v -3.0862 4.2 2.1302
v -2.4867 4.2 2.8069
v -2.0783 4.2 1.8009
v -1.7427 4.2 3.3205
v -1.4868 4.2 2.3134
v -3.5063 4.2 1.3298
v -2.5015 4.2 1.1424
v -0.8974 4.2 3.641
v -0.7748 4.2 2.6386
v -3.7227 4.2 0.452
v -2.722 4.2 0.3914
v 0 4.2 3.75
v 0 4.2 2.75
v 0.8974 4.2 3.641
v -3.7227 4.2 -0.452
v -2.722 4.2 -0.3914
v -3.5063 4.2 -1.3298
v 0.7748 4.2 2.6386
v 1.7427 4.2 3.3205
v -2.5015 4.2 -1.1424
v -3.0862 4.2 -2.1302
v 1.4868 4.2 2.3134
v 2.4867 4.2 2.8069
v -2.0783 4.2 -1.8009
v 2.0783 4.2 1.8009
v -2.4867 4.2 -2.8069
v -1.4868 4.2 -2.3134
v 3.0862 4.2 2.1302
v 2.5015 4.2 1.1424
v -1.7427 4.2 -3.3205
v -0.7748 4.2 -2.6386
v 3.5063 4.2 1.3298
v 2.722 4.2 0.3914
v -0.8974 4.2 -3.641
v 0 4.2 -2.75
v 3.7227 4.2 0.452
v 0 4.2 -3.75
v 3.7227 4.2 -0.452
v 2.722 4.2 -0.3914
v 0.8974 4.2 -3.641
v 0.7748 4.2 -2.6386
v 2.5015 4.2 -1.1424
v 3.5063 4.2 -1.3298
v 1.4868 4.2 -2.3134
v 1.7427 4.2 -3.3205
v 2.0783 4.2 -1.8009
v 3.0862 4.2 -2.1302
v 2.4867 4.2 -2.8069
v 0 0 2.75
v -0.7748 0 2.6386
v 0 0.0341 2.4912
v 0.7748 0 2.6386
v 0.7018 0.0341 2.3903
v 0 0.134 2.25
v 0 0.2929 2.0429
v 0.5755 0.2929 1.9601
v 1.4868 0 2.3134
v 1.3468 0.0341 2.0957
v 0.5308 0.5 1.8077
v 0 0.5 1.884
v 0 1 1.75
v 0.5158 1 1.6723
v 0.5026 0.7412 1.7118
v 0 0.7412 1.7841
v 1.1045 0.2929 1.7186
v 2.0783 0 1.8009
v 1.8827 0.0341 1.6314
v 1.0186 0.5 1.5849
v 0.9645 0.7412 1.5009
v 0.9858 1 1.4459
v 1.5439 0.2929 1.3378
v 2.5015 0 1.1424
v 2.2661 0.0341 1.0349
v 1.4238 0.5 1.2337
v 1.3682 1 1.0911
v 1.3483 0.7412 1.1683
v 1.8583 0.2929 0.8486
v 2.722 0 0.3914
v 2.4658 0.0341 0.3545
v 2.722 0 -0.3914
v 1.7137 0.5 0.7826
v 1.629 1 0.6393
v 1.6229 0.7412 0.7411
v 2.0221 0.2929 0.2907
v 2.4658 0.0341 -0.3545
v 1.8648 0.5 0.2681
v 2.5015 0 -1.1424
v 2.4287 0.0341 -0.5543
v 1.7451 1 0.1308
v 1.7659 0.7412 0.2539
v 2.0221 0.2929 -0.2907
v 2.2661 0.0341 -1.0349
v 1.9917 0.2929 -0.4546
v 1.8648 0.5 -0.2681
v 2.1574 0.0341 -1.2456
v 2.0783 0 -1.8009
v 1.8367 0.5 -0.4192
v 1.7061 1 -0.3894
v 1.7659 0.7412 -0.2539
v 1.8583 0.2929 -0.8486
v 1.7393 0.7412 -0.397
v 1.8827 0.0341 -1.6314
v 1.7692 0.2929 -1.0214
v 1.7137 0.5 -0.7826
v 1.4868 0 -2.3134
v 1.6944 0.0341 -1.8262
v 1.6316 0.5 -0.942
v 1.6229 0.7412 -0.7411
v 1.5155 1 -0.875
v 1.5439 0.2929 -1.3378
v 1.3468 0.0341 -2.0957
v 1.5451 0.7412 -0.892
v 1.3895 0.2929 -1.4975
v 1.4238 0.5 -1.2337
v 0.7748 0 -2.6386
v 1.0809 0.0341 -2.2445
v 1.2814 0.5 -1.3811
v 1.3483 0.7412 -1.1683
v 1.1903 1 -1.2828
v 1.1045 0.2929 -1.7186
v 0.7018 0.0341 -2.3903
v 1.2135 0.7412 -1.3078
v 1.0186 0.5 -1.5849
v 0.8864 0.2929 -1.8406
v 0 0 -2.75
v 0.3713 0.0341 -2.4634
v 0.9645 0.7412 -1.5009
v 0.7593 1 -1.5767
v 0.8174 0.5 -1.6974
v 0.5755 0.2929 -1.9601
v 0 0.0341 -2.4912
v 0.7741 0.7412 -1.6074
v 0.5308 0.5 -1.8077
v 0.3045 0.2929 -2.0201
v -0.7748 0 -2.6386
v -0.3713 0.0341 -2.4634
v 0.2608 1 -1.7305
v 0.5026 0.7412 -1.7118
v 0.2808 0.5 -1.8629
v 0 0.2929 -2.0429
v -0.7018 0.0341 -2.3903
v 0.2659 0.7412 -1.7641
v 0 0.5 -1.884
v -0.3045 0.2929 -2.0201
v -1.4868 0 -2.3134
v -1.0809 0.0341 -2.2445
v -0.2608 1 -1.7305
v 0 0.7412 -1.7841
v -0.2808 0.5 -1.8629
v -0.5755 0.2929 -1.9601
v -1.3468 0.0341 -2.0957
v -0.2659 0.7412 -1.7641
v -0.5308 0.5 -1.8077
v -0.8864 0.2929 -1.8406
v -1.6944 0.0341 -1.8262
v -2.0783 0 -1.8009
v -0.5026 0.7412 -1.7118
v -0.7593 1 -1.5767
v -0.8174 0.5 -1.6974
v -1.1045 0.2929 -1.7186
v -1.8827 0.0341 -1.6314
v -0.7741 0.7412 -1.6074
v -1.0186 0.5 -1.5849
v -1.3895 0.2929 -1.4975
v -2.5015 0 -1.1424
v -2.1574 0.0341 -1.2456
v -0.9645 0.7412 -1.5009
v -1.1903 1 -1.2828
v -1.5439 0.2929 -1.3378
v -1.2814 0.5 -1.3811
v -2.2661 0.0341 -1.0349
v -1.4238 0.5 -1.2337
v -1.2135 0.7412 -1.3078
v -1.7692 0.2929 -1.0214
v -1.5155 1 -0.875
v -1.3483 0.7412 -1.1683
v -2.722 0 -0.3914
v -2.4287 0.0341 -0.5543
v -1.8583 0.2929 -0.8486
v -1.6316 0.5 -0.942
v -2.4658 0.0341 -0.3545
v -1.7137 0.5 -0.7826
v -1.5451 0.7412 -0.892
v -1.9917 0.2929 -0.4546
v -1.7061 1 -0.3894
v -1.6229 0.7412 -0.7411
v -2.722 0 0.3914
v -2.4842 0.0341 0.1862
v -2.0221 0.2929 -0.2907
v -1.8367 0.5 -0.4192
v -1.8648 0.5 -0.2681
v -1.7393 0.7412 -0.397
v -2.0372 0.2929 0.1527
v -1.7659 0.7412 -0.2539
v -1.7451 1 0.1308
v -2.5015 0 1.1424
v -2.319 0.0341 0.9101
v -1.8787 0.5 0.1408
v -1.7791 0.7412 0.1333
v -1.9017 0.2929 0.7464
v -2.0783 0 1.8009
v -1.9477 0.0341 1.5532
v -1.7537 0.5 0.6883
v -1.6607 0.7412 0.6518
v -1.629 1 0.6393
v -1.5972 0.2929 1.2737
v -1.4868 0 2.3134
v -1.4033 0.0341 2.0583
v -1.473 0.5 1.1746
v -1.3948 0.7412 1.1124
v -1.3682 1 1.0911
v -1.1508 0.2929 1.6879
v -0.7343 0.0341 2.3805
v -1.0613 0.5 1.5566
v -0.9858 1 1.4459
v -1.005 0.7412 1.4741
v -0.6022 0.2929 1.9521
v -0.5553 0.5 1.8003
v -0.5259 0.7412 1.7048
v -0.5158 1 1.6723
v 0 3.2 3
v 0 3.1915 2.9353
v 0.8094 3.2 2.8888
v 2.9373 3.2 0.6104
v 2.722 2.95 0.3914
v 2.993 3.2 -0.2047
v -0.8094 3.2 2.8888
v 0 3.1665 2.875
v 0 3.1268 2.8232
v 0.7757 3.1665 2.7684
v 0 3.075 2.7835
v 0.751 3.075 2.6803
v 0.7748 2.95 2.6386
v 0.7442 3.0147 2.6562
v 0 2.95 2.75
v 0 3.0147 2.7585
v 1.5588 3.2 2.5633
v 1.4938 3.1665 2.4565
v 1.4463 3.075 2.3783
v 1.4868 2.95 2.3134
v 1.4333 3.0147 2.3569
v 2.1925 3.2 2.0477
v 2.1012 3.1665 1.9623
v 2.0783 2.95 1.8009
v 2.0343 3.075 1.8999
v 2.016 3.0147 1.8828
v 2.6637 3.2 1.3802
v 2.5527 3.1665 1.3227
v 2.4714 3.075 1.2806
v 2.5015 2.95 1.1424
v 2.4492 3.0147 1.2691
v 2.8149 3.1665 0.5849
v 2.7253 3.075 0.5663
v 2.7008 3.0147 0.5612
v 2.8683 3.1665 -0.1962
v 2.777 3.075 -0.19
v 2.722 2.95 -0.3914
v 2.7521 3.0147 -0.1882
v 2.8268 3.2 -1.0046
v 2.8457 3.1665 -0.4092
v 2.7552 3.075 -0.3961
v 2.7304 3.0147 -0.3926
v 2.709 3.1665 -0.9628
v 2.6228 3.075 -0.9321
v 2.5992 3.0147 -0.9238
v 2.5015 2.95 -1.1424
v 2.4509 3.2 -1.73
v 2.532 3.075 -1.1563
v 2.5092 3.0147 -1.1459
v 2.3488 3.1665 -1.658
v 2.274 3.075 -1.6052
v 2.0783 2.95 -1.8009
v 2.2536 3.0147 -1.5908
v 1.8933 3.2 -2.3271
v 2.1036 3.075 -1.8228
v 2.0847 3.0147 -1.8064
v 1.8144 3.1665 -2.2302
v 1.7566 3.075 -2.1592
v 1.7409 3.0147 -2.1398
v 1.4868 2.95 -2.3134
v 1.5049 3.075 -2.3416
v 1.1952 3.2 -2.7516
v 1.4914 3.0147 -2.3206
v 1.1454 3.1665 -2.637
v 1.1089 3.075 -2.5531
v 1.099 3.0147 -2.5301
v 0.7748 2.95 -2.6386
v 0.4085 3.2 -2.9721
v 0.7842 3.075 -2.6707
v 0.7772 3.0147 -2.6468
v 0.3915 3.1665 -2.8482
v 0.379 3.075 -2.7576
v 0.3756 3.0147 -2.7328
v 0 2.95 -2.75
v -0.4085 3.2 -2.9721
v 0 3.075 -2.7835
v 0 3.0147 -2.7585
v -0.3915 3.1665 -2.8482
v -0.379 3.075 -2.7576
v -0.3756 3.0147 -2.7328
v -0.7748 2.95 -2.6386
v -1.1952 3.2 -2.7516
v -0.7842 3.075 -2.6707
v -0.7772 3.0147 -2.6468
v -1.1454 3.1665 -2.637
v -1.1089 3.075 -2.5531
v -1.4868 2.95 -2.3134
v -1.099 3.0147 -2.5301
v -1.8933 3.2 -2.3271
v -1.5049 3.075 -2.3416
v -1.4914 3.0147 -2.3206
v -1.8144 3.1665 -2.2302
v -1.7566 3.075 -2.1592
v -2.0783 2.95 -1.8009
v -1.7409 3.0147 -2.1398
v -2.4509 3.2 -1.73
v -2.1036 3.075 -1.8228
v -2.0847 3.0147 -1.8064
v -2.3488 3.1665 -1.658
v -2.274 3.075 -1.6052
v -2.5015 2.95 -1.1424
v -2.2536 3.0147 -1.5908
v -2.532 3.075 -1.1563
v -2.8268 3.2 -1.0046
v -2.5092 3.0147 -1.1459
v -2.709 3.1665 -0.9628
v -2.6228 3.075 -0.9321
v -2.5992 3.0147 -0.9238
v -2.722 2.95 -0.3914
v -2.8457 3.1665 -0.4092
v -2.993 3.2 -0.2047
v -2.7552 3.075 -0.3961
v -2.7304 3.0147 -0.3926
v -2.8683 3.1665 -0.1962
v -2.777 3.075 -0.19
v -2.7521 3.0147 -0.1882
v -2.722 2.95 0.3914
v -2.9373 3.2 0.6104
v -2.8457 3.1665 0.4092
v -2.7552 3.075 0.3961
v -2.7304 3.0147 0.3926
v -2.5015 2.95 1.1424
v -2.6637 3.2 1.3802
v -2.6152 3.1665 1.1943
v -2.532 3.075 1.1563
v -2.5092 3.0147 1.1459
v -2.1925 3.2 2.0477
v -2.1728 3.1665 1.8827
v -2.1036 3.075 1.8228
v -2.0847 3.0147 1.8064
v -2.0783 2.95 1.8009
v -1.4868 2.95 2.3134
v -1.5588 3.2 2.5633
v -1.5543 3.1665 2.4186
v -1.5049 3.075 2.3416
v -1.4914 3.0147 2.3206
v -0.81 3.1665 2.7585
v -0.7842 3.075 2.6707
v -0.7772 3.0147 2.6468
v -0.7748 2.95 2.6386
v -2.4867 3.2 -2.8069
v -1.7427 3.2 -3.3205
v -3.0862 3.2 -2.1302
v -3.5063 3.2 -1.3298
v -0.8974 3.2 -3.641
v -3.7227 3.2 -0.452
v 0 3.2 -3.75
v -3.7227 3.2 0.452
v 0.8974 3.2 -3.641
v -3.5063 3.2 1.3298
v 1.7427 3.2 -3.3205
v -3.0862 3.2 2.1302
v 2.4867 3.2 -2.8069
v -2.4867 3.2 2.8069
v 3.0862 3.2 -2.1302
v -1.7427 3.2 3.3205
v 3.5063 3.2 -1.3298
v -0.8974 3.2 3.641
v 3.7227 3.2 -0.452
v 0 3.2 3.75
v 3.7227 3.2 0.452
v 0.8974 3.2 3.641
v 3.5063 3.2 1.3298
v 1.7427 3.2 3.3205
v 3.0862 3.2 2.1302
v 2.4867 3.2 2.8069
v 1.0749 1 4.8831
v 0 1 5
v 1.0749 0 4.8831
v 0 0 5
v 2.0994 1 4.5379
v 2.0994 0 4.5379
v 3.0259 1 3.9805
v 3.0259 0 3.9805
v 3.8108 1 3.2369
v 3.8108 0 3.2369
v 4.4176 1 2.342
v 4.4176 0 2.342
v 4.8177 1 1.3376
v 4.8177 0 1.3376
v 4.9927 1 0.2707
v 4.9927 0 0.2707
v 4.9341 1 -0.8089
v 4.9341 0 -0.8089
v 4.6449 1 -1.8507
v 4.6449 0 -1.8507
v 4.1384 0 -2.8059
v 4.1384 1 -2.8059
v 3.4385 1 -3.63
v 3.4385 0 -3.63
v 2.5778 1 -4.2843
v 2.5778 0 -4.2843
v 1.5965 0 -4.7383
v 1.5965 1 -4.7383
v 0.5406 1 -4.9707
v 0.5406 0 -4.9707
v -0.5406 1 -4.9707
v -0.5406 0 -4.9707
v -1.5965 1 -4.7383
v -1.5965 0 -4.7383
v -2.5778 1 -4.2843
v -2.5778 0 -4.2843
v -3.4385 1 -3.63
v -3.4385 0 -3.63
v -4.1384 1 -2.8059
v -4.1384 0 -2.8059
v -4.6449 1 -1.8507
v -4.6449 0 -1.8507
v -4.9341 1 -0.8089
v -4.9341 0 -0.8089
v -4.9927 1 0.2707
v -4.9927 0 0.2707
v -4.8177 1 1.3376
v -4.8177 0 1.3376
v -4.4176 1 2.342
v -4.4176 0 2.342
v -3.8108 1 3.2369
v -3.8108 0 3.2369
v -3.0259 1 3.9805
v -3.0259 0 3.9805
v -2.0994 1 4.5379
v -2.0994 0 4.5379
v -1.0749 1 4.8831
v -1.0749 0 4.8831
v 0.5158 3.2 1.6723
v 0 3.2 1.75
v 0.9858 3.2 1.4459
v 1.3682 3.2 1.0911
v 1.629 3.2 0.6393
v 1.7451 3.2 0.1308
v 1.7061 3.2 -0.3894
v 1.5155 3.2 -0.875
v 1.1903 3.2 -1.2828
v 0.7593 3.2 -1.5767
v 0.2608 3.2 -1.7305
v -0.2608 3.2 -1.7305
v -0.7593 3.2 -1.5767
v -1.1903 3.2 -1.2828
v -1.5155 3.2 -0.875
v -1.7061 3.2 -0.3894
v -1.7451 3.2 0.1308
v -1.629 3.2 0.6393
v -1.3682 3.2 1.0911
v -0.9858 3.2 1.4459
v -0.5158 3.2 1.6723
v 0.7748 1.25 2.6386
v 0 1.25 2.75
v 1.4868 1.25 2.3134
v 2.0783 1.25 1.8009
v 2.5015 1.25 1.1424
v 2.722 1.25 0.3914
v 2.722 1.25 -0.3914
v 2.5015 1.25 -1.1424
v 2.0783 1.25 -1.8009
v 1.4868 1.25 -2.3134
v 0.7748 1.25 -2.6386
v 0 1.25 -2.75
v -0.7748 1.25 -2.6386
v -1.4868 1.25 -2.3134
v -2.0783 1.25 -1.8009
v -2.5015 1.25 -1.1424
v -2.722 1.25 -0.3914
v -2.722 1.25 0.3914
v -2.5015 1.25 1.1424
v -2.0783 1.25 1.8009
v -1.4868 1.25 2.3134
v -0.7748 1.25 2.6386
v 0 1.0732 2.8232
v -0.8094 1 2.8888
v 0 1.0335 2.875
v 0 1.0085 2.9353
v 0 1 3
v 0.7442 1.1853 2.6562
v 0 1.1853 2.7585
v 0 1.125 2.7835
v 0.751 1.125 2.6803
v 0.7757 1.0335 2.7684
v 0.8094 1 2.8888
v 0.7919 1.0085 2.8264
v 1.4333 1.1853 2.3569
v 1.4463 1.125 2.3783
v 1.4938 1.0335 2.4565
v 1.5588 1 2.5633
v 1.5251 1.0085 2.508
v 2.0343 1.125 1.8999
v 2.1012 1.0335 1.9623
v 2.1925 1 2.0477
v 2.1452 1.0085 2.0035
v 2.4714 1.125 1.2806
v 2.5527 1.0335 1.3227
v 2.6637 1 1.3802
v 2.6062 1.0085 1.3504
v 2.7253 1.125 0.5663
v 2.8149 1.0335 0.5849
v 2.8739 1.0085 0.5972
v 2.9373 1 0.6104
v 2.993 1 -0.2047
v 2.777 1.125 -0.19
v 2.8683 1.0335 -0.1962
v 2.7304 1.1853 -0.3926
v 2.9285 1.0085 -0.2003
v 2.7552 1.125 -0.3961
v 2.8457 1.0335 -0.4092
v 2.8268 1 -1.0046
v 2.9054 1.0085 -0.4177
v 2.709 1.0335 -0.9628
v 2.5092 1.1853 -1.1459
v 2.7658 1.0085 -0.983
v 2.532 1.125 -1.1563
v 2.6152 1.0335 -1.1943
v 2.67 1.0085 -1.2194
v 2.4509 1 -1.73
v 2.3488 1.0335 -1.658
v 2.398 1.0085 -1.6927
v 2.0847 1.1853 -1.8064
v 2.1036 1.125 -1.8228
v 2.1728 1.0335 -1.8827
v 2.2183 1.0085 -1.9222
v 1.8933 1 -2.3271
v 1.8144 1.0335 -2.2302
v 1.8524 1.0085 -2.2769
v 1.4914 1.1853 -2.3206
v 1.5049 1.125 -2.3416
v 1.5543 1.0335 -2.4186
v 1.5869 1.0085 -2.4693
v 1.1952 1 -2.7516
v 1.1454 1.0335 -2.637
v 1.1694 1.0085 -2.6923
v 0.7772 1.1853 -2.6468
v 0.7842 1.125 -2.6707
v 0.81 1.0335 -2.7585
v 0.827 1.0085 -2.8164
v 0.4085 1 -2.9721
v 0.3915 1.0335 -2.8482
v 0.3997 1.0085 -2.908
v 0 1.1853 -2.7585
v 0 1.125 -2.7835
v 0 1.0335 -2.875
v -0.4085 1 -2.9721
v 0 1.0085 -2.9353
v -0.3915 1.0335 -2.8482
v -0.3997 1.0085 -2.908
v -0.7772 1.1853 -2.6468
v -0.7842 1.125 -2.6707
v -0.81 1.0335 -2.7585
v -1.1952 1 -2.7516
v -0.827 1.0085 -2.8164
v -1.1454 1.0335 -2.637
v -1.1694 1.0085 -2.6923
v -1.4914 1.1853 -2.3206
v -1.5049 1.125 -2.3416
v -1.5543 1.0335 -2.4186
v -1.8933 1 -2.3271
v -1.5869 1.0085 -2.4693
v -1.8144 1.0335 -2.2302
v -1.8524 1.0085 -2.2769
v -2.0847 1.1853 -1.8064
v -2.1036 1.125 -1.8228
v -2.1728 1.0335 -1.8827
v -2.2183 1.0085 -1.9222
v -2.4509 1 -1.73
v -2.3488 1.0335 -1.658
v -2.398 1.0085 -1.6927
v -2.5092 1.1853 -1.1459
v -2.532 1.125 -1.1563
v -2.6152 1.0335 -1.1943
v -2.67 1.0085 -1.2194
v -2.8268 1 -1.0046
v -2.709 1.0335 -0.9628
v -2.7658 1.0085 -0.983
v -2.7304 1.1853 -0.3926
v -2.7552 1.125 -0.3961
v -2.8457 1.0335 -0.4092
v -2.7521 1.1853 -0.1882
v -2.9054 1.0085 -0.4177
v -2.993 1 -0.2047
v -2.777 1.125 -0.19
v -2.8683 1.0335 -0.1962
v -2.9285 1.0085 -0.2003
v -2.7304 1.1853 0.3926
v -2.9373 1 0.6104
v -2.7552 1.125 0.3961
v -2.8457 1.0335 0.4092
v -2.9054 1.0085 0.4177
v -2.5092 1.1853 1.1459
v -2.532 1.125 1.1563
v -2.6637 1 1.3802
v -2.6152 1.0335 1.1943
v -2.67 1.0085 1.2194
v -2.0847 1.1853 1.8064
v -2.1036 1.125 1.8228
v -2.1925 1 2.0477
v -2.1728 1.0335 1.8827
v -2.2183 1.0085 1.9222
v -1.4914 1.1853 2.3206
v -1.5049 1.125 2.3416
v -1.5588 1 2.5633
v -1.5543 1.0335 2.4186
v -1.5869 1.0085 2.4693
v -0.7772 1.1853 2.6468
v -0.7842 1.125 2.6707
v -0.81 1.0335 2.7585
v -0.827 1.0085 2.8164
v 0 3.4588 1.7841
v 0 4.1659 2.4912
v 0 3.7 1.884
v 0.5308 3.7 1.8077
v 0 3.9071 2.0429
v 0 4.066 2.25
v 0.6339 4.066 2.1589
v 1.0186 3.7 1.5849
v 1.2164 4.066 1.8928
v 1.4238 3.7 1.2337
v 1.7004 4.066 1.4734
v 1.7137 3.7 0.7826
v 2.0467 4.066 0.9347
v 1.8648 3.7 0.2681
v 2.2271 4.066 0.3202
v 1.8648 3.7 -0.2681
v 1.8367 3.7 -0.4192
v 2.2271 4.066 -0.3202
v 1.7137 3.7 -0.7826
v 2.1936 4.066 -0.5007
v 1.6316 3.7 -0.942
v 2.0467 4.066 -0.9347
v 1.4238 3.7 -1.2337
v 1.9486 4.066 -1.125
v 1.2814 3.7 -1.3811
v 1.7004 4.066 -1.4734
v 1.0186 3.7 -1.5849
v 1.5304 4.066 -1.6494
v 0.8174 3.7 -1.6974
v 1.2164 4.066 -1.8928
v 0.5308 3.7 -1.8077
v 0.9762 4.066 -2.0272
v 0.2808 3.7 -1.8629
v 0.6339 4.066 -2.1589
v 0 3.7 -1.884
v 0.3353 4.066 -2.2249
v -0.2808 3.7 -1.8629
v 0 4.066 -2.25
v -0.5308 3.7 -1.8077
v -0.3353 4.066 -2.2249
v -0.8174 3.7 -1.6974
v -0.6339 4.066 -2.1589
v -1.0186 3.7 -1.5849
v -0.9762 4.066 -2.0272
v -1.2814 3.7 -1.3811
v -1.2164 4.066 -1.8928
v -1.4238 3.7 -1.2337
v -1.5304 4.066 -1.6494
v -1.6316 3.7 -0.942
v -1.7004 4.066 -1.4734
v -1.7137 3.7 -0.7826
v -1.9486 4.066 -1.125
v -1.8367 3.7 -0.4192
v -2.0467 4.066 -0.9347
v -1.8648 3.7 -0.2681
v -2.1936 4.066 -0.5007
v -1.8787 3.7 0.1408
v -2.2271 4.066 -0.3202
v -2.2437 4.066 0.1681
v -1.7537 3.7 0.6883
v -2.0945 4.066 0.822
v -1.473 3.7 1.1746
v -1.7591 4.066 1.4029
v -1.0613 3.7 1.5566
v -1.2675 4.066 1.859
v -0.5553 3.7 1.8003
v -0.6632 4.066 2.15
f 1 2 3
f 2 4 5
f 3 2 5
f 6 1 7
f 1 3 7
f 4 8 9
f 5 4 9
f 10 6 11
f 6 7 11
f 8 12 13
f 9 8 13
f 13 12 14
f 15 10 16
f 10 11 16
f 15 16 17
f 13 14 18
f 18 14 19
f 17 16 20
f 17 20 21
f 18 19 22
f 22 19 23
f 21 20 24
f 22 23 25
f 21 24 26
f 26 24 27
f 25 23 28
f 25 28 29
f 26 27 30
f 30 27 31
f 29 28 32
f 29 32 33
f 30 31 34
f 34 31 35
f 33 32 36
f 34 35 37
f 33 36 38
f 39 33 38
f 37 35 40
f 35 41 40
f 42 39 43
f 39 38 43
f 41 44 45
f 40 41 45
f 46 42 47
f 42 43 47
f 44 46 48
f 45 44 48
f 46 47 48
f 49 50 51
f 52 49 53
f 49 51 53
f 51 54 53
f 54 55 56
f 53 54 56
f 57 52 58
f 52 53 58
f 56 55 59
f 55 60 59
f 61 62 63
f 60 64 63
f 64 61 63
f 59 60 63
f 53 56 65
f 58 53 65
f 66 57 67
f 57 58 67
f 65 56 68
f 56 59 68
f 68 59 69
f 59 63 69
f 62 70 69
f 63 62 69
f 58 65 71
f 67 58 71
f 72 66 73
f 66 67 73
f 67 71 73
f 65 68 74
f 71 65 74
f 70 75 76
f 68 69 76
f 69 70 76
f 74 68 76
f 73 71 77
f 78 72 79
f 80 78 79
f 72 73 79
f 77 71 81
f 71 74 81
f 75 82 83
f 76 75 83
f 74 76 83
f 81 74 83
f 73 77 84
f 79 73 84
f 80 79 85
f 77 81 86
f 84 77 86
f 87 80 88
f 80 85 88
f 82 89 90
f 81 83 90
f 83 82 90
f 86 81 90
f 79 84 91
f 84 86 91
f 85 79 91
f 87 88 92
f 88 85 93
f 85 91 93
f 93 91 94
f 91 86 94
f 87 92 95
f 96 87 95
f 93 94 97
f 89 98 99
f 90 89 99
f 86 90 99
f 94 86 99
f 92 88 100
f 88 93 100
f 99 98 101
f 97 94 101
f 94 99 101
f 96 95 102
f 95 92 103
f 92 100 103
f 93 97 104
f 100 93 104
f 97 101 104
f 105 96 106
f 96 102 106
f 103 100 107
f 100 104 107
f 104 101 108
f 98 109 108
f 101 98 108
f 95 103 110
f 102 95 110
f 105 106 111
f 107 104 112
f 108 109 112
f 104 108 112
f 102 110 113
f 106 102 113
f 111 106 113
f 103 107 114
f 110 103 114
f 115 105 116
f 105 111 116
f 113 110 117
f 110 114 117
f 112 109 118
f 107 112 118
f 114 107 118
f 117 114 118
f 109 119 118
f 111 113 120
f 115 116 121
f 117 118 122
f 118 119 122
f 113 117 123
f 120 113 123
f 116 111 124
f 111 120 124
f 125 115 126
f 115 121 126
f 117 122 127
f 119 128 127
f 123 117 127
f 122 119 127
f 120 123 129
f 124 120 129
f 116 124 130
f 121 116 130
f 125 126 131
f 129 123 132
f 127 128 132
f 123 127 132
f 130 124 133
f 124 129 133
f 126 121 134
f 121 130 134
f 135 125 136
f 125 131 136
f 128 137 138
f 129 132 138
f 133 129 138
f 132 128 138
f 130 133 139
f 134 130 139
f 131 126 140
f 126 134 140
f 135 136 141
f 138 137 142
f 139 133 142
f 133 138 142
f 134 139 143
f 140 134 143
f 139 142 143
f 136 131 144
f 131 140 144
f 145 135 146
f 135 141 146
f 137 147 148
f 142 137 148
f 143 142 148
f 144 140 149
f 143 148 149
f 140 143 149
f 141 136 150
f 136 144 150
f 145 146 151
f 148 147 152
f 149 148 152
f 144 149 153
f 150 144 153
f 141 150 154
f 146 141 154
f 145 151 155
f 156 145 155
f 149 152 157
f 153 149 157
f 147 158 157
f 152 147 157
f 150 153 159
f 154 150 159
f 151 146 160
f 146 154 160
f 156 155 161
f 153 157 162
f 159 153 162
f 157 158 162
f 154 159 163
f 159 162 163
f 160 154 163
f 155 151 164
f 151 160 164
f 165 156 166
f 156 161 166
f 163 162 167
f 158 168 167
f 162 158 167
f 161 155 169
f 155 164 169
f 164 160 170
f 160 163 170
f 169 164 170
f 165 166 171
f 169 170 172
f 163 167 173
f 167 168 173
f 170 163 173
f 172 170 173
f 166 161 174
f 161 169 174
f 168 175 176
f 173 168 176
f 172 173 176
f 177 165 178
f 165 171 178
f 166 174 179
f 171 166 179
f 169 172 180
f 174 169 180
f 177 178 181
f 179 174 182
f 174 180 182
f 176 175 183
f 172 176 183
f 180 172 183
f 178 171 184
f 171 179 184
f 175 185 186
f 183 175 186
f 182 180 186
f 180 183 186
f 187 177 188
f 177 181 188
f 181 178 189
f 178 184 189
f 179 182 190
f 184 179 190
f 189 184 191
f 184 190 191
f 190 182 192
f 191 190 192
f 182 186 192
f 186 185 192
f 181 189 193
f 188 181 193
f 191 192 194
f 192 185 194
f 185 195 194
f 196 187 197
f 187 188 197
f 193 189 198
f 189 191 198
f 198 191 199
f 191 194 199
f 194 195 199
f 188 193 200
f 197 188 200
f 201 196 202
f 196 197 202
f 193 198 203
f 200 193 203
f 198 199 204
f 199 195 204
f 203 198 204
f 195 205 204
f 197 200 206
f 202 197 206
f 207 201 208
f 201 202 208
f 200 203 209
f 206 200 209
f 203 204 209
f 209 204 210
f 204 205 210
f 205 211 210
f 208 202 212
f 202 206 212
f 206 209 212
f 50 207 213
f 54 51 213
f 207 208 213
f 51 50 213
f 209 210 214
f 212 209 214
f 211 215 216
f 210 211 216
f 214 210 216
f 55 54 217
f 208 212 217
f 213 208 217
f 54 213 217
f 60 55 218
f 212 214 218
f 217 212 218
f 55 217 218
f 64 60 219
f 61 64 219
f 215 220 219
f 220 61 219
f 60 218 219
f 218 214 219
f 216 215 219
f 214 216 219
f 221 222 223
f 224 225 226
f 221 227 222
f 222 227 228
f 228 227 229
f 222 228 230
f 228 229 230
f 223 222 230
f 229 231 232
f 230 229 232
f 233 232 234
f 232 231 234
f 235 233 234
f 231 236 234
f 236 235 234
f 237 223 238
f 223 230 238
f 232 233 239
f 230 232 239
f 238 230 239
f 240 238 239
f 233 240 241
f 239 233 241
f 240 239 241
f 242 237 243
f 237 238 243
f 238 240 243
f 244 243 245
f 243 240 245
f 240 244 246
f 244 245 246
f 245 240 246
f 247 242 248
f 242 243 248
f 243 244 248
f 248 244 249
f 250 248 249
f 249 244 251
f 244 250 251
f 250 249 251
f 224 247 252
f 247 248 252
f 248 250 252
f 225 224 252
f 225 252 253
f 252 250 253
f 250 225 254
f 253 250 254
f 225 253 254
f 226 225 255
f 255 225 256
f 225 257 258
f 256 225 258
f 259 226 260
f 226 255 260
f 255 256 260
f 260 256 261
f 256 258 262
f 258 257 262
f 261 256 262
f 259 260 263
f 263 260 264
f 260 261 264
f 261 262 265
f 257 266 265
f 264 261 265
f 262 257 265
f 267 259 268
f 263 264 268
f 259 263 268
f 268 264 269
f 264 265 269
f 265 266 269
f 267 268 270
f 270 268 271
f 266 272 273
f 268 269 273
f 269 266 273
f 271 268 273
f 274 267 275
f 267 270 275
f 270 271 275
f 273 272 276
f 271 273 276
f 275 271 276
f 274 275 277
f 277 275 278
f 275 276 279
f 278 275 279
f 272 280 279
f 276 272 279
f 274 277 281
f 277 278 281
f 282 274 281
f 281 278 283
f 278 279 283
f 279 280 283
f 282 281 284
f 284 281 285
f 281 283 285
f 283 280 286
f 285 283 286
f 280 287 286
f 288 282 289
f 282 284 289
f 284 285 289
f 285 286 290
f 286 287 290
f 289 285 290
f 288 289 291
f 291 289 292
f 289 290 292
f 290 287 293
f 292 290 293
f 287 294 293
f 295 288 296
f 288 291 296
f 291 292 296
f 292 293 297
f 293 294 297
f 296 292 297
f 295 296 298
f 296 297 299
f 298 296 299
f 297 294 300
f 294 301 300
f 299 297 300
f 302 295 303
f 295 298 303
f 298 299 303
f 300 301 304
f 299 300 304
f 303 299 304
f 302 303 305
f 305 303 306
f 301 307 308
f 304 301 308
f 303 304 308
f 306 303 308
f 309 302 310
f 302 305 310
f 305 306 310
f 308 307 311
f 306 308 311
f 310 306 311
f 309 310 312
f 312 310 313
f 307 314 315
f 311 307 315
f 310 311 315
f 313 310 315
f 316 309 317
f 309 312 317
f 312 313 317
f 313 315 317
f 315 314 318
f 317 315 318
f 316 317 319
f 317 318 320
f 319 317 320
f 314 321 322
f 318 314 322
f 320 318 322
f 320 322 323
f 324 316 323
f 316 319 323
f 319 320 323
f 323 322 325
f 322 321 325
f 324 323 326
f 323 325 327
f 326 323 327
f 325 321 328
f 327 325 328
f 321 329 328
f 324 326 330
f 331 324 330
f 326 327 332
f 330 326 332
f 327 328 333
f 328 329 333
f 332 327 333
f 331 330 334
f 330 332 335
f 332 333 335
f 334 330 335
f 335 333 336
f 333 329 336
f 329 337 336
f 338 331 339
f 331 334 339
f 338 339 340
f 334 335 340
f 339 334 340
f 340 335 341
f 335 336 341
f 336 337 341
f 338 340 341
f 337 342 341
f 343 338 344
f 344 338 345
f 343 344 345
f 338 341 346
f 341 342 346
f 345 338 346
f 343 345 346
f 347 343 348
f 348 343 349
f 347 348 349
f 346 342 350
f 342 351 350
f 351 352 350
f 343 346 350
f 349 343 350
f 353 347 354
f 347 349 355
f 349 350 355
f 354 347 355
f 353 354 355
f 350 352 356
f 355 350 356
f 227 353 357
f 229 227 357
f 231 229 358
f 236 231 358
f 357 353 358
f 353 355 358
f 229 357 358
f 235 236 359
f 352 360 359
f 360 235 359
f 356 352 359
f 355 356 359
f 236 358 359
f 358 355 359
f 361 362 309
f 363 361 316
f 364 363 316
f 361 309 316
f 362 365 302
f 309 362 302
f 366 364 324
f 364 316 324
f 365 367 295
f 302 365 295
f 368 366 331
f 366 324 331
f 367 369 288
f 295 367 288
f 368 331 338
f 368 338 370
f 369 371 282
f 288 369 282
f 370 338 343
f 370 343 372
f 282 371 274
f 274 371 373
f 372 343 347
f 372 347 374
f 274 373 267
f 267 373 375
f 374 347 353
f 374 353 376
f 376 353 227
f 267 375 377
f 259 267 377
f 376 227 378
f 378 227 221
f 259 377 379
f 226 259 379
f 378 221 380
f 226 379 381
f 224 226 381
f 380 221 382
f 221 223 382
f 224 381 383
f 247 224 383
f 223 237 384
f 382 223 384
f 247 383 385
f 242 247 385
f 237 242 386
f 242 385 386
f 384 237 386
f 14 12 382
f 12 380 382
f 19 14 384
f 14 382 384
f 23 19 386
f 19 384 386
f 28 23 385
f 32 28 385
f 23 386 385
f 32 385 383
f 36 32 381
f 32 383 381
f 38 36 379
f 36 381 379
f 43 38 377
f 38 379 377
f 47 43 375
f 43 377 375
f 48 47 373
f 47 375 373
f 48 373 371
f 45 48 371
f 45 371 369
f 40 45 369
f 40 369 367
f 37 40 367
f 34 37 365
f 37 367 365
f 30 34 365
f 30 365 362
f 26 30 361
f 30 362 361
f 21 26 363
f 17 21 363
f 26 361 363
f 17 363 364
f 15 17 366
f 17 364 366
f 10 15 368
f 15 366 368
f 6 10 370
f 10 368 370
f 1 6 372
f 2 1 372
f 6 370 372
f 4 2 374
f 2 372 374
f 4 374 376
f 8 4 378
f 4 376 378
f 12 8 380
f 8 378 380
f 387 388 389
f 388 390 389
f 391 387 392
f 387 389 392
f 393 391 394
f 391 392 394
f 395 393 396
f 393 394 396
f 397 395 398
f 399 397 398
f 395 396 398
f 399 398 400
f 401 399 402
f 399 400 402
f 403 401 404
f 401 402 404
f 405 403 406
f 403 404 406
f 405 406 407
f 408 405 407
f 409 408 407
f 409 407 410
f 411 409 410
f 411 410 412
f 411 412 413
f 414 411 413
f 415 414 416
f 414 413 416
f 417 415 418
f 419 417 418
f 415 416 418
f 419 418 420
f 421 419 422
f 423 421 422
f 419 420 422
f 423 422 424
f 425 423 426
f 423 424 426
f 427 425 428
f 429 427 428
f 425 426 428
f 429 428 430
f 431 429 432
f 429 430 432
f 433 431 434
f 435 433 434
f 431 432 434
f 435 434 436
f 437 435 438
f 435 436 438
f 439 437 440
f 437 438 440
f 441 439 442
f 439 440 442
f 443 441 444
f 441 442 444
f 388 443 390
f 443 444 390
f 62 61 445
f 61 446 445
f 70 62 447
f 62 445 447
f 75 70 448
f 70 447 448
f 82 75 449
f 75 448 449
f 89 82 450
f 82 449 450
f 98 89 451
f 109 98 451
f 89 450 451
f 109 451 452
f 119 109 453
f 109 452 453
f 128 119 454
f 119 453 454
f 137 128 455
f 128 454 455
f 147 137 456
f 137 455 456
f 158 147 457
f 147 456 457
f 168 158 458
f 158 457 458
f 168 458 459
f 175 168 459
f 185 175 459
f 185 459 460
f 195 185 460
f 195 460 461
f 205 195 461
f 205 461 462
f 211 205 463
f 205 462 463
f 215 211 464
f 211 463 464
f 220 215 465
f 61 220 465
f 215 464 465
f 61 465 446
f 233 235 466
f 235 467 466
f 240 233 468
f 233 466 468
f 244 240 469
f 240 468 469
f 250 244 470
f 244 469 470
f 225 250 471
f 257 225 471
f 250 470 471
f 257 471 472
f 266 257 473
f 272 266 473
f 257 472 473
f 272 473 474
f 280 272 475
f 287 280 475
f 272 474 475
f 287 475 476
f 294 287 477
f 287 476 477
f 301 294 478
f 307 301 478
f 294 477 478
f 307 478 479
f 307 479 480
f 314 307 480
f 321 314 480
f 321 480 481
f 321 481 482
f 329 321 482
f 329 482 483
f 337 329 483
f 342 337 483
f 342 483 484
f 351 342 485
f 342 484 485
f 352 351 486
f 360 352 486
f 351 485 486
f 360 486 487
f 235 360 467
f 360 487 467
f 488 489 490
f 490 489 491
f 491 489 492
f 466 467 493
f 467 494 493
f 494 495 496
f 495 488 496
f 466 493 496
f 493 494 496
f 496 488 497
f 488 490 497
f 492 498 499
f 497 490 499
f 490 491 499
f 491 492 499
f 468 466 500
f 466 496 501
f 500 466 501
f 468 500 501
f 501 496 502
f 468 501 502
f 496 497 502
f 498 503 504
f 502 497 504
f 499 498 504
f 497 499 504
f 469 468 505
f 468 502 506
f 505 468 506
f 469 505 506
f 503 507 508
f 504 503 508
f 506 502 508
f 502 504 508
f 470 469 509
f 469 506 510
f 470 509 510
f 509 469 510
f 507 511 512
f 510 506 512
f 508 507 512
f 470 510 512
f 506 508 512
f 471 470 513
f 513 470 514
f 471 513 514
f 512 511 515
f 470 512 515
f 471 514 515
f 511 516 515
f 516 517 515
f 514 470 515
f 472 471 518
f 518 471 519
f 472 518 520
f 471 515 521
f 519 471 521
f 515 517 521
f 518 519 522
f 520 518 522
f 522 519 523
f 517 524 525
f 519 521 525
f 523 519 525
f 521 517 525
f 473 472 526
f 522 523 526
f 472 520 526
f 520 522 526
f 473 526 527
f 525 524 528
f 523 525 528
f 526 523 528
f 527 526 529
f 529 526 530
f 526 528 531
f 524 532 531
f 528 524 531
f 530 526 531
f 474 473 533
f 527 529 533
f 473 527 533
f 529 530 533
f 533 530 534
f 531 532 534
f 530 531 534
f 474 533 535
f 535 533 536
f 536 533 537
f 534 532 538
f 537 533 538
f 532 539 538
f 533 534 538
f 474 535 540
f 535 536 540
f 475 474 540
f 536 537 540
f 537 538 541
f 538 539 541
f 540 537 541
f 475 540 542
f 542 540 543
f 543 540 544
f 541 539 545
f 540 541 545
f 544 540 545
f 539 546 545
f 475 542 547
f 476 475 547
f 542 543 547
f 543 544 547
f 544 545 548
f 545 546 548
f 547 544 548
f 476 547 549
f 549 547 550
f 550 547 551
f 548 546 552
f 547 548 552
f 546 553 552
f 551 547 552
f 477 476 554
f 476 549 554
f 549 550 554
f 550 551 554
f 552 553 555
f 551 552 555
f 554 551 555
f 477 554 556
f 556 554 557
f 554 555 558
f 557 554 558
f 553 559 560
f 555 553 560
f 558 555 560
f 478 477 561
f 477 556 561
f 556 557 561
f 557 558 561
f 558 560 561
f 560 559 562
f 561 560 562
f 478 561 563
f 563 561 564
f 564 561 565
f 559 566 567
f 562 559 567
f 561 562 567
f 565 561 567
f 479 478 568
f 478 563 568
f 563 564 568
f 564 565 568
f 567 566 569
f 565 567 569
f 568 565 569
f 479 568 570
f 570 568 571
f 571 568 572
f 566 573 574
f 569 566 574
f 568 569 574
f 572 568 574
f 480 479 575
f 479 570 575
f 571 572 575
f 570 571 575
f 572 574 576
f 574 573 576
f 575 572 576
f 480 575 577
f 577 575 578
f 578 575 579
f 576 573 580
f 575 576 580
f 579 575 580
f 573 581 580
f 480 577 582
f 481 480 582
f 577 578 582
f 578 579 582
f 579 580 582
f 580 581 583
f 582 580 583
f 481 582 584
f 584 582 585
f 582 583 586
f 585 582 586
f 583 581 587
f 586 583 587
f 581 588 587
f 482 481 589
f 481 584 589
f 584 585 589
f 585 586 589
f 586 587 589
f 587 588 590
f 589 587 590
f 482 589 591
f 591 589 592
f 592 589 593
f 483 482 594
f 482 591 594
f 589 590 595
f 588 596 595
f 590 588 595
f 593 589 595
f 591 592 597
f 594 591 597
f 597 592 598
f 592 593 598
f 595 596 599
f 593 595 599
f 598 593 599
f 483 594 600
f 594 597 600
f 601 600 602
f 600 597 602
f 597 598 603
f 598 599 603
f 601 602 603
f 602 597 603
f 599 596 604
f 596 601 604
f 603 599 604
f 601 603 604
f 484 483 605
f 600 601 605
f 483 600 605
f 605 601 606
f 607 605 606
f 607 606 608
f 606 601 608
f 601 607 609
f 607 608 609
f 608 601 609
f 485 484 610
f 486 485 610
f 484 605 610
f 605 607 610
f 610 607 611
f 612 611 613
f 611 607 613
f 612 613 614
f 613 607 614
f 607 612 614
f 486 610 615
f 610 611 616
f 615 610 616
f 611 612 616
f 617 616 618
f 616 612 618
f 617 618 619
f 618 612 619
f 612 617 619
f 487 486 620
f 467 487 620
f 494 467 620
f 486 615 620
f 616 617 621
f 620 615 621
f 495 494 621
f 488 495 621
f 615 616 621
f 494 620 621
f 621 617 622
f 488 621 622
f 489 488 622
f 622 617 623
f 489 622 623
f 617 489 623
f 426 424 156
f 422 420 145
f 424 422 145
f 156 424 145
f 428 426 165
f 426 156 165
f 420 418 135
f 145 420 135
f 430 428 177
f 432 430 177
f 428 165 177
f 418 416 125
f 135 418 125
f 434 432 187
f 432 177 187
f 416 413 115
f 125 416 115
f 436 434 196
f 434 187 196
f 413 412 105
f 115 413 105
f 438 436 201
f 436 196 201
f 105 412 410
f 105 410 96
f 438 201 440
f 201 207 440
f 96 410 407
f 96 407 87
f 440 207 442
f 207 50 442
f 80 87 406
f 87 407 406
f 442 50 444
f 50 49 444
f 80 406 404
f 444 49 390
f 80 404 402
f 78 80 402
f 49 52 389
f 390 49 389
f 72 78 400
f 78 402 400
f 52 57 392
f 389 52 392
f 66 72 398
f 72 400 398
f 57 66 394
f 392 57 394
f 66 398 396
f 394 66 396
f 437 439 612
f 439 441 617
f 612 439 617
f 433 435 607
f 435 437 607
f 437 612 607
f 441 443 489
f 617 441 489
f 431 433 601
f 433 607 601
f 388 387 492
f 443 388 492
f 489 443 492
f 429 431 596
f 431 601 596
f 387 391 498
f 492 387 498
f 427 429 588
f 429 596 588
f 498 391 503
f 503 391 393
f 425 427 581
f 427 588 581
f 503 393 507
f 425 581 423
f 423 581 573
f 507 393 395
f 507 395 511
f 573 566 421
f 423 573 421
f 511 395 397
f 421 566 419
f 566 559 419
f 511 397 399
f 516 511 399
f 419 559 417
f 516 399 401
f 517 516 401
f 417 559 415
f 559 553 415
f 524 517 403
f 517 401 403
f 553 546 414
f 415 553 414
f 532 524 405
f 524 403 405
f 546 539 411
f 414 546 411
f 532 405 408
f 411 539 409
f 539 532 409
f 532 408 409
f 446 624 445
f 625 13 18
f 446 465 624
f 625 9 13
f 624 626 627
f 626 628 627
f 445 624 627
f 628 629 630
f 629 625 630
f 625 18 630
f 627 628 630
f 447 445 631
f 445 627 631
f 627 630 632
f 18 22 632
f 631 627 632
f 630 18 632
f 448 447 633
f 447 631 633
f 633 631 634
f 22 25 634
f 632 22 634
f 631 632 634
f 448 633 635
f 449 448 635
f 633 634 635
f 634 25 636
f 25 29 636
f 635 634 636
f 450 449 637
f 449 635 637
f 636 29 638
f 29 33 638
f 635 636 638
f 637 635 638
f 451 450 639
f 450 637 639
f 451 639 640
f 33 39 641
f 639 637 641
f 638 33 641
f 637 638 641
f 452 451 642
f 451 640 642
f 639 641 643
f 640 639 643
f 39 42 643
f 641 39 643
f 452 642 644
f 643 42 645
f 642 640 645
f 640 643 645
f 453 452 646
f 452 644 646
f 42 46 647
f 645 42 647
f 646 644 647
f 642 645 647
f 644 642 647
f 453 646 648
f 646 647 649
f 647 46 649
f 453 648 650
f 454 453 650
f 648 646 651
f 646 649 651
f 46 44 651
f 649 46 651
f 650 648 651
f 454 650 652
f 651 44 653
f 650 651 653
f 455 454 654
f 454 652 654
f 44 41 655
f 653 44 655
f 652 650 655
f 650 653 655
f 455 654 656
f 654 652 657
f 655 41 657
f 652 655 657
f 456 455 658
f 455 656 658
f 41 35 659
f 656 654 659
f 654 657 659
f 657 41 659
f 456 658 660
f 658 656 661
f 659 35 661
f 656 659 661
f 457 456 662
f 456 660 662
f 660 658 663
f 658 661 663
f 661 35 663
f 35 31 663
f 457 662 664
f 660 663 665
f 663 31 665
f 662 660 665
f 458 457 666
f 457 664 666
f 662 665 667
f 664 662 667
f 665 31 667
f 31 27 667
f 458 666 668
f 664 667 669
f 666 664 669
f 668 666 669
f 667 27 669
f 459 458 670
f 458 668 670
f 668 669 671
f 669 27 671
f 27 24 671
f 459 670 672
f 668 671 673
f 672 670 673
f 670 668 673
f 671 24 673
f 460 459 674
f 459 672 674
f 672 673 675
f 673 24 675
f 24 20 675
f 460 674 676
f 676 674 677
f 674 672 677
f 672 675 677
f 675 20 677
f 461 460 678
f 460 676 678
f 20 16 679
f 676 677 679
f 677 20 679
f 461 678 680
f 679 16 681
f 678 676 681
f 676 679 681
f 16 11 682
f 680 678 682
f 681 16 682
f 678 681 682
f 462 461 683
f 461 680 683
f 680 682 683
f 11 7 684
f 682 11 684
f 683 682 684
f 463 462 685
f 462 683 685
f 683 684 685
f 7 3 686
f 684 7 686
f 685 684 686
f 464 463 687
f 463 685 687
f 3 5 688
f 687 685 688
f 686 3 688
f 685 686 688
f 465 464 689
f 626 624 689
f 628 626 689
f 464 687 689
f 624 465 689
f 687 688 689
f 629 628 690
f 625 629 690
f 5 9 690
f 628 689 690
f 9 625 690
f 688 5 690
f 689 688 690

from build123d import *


with BuildPart() as f1:
    # F0 (on Right) → F1 (revolve)
    with BuildSketch(Plane.YZ):
        with BuildLine():
            Line((1, 3), (1, 5))
            Line((1, 5), (0, 5))
            Line((0, 5), (0, 2.75))
            ThreePointArc((0, 2.75), (0.292893, 2.042893), (1, 1.75))
            Line((1, 1.75), (3.2, 1.75))
            ThreePointArc((3.2, 1.75), (3.907107, 2.042893), (4.2, 2.75))
            Line((4.2, 2.75), (4.2, 3.75))
            Line((4.2, 3.75), (3.2, 3.75))
            Line((3.2, 3.75), (3.2, 3))
            ThreePointArc((3.2, 3), (3.126777, 2.823223), (2.95, 2.75))
            Line((2.95, 2.75), (1.25, 2.75))
            ThreePointArc((1.25, 2.75), (1.073223, 2.823223), (1, 3))
        make_face()
    revolve(axis=Axis((0, 2.1, 0), (0, 1, 0)))


solid = f1.part
